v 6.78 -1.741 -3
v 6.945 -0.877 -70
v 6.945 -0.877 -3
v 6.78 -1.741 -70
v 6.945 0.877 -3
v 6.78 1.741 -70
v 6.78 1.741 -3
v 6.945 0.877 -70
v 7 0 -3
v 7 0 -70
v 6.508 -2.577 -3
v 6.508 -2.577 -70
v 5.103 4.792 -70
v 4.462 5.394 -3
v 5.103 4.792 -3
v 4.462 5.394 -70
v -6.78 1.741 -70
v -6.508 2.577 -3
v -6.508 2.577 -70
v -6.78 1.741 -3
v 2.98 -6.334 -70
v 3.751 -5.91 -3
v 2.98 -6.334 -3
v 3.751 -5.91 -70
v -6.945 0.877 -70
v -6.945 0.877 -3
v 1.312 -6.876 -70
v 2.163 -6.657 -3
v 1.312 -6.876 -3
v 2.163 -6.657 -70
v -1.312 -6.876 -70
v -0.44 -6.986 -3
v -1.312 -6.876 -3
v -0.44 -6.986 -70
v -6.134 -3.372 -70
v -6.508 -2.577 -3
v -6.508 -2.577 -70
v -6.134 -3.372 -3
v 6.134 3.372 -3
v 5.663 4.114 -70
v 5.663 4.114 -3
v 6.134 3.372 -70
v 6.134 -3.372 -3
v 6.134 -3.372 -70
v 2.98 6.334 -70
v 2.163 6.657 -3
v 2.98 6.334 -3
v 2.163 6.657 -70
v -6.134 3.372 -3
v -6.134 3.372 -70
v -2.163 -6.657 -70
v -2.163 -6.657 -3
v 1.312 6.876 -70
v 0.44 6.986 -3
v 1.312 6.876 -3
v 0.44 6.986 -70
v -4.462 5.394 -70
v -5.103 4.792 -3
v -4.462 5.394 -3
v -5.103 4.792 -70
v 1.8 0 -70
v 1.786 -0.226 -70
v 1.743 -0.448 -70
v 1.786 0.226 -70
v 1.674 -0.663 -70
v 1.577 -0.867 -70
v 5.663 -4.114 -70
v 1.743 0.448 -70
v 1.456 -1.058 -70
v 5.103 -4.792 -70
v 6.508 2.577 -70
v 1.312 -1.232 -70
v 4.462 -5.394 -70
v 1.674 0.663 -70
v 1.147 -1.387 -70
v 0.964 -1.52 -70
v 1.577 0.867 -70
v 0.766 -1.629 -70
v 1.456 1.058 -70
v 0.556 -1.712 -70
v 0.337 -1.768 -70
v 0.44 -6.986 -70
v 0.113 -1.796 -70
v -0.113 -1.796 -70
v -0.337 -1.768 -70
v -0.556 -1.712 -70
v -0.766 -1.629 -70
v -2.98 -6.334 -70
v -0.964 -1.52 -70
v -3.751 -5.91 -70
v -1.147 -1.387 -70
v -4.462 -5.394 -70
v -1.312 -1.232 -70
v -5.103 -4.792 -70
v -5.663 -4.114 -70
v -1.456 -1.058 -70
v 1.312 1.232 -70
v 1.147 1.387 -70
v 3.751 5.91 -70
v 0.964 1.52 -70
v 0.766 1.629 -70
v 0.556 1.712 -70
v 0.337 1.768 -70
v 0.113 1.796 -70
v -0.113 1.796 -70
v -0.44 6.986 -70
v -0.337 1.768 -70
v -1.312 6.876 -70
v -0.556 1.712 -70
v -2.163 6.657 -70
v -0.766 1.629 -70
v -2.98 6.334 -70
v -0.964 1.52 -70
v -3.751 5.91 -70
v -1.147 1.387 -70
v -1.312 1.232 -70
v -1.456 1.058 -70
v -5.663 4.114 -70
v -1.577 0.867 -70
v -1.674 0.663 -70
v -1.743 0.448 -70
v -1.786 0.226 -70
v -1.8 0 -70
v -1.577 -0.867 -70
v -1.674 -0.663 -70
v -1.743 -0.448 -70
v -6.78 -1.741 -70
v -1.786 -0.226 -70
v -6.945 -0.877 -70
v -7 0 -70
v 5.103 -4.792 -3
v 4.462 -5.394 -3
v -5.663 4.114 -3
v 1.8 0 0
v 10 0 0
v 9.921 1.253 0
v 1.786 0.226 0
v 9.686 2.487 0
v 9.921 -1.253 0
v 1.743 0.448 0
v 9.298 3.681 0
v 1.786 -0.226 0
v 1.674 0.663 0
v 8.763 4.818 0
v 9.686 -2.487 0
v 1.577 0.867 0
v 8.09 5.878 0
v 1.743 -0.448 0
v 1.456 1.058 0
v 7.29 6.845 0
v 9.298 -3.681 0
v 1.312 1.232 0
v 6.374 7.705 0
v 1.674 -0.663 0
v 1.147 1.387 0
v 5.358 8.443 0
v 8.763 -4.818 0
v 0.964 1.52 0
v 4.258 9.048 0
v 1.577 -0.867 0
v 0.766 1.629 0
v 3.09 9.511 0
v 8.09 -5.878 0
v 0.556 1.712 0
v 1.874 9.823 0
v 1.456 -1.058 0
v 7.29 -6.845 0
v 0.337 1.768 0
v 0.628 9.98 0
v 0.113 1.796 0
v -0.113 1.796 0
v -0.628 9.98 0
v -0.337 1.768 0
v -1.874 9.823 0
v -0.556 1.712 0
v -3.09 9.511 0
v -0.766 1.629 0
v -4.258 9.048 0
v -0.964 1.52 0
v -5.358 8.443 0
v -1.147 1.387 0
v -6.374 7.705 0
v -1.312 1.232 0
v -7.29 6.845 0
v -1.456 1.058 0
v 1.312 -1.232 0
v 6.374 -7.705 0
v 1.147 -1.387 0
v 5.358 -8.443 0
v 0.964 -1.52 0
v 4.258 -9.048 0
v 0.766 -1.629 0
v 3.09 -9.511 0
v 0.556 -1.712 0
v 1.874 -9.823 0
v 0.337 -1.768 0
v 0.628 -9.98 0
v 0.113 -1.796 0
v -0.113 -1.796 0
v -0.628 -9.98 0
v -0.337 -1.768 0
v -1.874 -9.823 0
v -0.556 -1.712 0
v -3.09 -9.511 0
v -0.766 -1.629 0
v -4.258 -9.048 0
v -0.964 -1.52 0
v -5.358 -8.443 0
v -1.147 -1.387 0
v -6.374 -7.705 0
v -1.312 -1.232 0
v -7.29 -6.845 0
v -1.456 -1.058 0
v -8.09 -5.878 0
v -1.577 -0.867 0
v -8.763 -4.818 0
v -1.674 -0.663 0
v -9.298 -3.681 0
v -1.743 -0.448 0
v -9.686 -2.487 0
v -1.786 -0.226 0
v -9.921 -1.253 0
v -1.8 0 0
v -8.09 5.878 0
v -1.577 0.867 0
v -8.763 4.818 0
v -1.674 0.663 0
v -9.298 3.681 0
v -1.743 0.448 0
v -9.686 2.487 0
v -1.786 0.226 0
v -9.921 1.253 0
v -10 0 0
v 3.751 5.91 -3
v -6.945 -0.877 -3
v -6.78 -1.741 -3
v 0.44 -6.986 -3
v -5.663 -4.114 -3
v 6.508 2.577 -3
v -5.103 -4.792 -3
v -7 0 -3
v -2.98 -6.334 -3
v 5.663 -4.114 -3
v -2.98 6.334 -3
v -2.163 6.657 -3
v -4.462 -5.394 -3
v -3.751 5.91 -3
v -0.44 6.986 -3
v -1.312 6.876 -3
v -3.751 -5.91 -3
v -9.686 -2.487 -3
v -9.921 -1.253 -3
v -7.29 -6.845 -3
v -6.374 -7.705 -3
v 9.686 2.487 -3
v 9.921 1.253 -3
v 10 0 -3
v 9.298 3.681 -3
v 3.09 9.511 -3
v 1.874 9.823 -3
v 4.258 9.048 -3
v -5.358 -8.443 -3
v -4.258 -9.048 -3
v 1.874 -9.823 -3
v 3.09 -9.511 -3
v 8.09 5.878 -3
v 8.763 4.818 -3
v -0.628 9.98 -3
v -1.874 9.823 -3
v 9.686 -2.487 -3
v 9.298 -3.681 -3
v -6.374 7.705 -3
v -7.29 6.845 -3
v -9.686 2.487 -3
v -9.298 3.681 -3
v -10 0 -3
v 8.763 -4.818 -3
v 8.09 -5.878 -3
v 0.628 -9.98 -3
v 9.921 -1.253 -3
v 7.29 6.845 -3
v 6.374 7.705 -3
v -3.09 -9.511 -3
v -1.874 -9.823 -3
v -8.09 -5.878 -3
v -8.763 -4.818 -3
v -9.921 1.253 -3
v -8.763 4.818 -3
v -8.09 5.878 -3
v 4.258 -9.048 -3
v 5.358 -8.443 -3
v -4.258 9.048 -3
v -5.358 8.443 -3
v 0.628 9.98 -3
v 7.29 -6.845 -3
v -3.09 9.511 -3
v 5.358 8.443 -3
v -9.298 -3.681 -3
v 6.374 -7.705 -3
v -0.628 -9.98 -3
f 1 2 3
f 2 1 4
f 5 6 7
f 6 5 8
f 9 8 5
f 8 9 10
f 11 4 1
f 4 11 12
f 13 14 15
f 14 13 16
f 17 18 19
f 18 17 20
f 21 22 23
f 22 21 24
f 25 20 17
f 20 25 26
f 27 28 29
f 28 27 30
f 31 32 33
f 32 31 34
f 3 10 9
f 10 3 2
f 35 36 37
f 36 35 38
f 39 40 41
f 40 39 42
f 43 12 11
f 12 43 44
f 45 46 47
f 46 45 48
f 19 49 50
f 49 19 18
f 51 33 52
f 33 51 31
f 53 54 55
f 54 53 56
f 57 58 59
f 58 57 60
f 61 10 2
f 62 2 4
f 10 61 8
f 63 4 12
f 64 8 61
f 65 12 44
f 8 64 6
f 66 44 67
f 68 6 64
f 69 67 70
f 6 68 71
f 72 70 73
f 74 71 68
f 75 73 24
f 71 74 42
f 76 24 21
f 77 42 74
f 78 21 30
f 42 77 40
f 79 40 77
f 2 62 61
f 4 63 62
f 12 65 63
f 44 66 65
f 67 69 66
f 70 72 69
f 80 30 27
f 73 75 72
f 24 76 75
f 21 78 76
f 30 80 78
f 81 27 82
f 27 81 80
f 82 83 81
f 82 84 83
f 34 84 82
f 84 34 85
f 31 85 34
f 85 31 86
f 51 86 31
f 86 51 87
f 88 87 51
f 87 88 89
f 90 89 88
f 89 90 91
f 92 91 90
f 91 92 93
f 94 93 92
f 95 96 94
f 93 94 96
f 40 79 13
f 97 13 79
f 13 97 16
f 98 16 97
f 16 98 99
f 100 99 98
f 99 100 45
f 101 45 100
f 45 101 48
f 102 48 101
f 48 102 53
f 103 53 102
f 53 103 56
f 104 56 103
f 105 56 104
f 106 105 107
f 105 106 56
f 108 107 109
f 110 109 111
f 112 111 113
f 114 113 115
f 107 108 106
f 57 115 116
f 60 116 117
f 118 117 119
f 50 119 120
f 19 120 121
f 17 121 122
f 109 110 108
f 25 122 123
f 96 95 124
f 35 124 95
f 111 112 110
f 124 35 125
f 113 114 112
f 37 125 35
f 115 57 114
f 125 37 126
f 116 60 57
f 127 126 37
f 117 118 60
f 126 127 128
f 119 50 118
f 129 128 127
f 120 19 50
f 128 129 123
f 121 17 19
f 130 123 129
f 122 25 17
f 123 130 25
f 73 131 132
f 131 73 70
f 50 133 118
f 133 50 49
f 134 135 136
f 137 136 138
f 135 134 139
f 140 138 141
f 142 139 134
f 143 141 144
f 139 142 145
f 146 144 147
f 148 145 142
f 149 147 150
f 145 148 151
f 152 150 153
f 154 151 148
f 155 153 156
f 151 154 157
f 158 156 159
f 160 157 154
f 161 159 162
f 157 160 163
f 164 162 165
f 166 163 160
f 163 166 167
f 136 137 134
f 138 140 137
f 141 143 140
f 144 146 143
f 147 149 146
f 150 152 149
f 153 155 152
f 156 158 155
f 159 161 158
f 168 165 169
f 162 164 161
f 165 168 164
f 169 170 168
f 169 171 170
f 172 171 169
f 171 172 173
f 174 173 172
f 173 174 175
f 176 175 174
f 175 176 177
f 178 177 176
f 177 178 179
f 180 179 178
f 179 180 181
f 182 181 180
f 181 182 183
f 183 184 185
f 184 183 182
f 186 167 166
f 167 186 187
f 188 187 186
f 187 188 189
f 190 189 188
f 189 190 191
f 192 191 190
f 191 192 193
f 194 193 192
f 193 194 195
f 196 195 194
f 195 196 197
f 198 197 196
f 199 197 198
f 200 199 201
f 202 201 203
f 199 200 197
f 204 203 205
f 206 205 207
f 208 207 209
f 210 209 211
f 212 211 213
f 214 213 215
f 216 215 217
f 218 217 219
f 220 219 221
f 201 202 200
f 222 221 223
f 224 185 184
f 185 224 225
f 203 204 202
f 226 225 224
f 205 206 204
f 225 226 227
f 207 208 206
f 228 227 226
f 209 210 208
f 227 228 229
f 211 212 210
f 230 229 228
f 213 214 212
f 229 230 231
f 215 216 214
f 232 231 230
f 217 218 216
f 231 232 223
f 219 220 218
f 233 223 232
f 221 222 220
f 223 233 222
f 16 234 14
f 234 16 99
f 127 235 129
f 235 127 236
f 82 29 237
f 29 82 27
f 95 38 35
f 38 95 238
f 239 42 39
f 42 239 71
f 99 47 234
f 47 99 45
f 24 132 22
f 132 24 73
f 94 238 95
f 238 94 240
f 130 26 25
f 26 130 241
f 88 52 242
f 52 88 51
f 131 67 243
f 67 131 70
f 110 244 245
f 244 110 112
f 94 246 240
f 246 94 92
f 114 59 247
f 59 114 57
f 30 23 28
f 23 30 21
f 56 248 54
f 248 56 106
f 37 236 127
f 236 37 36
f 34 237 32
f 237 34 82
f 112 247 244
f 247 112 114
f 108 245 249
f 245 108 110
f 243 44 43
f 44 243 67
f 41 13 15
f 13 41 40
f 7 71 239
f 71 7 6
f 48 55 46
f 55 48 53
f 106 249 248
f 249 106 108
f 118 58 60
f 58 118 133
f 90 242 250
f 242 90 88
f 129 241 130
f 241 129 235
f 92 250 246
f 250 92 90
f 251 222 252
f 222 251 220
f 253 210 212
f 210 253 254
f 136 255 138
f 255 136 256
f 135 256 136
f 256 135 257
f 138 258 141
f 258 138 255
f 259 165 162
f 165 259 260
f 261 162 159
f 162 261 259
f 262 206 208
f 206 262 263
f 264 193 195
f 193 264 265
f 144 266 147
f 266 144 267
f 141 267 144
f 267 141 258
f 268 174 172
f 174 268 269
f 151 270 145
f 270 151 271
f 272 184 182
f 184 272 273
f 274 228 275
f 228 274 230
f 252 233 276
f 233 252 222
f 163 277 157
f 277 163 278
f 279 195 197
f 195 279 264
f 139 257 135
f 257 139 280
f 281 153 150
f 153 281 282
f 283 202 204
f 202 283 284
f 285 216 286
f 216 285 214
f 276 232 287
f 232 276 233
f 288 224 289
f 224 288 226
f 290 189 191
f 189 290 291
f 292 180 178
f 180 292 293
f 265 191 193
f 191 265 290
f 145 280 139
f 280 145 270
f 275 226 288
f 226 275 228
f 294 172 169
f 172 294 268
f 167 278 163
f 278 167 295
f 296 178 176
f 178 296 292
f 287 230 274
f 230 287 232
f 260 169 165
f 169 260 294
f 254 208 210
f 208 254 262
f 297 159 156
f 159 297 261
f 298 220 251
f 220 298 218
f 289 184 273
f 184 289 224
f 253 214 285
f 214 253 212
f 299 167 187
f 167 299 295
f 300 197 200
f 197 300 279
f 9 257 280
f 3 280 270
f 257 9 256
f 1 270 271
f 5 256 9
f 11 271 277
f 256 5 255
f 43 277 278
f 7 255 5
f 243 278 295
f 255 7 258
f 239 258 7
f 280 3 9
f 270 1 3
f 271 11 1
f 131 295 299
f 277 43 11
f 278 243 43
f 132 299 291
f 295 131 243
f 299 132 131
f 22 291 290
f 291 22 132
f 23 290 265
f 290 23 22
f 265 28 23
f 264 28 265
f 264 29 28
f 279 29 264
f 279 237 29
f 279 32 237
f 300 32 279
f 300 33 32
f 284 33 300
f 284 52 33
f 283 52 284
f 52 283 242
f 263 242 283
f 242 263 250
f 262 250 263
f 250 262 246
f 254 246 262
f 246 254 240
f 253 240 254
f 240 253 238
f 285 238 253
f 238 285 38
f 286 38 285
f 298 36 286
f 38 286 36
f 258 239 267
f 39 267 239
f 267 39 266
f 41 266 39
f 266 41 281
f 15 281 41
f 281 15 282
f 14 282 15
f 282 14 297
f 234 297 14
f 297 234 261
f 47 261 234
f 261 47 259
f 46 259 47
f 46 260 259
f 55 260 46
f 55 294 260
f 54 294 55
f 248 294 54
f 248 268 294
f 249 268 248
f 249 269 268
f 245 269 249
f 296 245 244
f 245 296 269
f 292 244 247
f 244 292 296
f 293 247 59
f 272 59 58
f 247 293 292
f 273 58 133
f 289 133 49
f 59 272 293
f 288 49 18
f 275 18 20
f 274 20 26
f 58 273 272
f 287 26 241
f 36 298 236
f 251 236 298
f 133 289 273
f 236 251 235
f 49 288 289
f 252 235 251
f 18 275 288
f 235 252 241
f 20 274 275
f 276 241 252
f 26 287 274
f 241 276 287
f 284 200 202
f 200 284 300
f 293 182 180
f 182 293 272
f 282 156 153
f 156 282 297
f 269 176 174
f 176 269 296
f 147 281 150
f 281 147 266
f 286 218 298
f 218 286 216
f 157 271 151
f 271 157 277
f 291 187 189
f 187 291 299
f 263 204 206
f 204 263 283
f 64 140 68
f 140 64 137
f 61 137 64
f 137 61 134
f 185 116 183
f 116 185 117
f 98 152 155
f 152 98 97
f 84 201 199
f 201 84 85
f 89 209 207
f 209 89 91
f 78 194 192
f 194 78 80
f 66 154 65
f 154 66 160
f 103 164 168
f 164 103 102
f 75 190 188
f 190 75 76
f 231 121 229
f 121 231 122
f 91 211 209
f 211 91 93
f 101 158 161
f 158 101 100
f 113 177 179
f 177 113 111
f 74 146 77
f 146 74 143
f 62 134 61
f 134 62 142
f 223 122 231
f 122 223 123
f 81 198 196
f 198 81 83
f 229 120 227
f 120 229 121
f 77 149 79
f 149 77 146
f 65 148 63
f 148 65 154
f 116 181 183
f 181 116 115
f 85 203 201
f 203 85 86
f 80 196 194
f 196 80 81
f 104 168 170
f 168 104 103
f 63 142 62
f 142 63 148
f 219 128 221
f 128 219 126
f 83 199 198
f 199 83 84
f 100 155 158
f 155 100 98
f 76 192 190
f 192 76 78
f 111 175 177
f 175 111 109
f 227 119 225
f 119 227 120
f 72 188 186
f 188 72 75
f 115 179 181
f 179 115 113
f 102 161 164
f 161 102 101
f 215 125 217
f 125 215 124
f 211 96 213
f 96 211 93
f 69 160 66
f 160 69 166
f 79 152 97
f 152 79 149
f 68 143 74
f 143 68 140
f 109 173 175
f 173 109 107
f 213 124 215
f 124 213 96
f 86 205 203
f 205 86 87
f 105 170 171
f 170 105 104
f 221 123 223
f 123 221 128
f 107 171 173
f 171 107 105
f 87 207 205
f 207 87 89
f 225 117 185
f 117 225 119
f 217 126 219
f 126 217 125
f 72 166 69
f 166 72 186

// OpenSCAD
$fn = 50;


difference() {
	union() {
		translate(v = [0, 0, -70.0000000000]) {
			cylinder(h = 70, r = 7.0000000000);
		}
		translate(v = [0, 0, -3.0000000000]) {
			cylinder(h = 3, r = 10.0000000000);
		}
	}
	union() {
		#translate(v = [0, 0, -70]) {
			cylinder(h = 70, r = 1.8000000000);
		}
	}
}
